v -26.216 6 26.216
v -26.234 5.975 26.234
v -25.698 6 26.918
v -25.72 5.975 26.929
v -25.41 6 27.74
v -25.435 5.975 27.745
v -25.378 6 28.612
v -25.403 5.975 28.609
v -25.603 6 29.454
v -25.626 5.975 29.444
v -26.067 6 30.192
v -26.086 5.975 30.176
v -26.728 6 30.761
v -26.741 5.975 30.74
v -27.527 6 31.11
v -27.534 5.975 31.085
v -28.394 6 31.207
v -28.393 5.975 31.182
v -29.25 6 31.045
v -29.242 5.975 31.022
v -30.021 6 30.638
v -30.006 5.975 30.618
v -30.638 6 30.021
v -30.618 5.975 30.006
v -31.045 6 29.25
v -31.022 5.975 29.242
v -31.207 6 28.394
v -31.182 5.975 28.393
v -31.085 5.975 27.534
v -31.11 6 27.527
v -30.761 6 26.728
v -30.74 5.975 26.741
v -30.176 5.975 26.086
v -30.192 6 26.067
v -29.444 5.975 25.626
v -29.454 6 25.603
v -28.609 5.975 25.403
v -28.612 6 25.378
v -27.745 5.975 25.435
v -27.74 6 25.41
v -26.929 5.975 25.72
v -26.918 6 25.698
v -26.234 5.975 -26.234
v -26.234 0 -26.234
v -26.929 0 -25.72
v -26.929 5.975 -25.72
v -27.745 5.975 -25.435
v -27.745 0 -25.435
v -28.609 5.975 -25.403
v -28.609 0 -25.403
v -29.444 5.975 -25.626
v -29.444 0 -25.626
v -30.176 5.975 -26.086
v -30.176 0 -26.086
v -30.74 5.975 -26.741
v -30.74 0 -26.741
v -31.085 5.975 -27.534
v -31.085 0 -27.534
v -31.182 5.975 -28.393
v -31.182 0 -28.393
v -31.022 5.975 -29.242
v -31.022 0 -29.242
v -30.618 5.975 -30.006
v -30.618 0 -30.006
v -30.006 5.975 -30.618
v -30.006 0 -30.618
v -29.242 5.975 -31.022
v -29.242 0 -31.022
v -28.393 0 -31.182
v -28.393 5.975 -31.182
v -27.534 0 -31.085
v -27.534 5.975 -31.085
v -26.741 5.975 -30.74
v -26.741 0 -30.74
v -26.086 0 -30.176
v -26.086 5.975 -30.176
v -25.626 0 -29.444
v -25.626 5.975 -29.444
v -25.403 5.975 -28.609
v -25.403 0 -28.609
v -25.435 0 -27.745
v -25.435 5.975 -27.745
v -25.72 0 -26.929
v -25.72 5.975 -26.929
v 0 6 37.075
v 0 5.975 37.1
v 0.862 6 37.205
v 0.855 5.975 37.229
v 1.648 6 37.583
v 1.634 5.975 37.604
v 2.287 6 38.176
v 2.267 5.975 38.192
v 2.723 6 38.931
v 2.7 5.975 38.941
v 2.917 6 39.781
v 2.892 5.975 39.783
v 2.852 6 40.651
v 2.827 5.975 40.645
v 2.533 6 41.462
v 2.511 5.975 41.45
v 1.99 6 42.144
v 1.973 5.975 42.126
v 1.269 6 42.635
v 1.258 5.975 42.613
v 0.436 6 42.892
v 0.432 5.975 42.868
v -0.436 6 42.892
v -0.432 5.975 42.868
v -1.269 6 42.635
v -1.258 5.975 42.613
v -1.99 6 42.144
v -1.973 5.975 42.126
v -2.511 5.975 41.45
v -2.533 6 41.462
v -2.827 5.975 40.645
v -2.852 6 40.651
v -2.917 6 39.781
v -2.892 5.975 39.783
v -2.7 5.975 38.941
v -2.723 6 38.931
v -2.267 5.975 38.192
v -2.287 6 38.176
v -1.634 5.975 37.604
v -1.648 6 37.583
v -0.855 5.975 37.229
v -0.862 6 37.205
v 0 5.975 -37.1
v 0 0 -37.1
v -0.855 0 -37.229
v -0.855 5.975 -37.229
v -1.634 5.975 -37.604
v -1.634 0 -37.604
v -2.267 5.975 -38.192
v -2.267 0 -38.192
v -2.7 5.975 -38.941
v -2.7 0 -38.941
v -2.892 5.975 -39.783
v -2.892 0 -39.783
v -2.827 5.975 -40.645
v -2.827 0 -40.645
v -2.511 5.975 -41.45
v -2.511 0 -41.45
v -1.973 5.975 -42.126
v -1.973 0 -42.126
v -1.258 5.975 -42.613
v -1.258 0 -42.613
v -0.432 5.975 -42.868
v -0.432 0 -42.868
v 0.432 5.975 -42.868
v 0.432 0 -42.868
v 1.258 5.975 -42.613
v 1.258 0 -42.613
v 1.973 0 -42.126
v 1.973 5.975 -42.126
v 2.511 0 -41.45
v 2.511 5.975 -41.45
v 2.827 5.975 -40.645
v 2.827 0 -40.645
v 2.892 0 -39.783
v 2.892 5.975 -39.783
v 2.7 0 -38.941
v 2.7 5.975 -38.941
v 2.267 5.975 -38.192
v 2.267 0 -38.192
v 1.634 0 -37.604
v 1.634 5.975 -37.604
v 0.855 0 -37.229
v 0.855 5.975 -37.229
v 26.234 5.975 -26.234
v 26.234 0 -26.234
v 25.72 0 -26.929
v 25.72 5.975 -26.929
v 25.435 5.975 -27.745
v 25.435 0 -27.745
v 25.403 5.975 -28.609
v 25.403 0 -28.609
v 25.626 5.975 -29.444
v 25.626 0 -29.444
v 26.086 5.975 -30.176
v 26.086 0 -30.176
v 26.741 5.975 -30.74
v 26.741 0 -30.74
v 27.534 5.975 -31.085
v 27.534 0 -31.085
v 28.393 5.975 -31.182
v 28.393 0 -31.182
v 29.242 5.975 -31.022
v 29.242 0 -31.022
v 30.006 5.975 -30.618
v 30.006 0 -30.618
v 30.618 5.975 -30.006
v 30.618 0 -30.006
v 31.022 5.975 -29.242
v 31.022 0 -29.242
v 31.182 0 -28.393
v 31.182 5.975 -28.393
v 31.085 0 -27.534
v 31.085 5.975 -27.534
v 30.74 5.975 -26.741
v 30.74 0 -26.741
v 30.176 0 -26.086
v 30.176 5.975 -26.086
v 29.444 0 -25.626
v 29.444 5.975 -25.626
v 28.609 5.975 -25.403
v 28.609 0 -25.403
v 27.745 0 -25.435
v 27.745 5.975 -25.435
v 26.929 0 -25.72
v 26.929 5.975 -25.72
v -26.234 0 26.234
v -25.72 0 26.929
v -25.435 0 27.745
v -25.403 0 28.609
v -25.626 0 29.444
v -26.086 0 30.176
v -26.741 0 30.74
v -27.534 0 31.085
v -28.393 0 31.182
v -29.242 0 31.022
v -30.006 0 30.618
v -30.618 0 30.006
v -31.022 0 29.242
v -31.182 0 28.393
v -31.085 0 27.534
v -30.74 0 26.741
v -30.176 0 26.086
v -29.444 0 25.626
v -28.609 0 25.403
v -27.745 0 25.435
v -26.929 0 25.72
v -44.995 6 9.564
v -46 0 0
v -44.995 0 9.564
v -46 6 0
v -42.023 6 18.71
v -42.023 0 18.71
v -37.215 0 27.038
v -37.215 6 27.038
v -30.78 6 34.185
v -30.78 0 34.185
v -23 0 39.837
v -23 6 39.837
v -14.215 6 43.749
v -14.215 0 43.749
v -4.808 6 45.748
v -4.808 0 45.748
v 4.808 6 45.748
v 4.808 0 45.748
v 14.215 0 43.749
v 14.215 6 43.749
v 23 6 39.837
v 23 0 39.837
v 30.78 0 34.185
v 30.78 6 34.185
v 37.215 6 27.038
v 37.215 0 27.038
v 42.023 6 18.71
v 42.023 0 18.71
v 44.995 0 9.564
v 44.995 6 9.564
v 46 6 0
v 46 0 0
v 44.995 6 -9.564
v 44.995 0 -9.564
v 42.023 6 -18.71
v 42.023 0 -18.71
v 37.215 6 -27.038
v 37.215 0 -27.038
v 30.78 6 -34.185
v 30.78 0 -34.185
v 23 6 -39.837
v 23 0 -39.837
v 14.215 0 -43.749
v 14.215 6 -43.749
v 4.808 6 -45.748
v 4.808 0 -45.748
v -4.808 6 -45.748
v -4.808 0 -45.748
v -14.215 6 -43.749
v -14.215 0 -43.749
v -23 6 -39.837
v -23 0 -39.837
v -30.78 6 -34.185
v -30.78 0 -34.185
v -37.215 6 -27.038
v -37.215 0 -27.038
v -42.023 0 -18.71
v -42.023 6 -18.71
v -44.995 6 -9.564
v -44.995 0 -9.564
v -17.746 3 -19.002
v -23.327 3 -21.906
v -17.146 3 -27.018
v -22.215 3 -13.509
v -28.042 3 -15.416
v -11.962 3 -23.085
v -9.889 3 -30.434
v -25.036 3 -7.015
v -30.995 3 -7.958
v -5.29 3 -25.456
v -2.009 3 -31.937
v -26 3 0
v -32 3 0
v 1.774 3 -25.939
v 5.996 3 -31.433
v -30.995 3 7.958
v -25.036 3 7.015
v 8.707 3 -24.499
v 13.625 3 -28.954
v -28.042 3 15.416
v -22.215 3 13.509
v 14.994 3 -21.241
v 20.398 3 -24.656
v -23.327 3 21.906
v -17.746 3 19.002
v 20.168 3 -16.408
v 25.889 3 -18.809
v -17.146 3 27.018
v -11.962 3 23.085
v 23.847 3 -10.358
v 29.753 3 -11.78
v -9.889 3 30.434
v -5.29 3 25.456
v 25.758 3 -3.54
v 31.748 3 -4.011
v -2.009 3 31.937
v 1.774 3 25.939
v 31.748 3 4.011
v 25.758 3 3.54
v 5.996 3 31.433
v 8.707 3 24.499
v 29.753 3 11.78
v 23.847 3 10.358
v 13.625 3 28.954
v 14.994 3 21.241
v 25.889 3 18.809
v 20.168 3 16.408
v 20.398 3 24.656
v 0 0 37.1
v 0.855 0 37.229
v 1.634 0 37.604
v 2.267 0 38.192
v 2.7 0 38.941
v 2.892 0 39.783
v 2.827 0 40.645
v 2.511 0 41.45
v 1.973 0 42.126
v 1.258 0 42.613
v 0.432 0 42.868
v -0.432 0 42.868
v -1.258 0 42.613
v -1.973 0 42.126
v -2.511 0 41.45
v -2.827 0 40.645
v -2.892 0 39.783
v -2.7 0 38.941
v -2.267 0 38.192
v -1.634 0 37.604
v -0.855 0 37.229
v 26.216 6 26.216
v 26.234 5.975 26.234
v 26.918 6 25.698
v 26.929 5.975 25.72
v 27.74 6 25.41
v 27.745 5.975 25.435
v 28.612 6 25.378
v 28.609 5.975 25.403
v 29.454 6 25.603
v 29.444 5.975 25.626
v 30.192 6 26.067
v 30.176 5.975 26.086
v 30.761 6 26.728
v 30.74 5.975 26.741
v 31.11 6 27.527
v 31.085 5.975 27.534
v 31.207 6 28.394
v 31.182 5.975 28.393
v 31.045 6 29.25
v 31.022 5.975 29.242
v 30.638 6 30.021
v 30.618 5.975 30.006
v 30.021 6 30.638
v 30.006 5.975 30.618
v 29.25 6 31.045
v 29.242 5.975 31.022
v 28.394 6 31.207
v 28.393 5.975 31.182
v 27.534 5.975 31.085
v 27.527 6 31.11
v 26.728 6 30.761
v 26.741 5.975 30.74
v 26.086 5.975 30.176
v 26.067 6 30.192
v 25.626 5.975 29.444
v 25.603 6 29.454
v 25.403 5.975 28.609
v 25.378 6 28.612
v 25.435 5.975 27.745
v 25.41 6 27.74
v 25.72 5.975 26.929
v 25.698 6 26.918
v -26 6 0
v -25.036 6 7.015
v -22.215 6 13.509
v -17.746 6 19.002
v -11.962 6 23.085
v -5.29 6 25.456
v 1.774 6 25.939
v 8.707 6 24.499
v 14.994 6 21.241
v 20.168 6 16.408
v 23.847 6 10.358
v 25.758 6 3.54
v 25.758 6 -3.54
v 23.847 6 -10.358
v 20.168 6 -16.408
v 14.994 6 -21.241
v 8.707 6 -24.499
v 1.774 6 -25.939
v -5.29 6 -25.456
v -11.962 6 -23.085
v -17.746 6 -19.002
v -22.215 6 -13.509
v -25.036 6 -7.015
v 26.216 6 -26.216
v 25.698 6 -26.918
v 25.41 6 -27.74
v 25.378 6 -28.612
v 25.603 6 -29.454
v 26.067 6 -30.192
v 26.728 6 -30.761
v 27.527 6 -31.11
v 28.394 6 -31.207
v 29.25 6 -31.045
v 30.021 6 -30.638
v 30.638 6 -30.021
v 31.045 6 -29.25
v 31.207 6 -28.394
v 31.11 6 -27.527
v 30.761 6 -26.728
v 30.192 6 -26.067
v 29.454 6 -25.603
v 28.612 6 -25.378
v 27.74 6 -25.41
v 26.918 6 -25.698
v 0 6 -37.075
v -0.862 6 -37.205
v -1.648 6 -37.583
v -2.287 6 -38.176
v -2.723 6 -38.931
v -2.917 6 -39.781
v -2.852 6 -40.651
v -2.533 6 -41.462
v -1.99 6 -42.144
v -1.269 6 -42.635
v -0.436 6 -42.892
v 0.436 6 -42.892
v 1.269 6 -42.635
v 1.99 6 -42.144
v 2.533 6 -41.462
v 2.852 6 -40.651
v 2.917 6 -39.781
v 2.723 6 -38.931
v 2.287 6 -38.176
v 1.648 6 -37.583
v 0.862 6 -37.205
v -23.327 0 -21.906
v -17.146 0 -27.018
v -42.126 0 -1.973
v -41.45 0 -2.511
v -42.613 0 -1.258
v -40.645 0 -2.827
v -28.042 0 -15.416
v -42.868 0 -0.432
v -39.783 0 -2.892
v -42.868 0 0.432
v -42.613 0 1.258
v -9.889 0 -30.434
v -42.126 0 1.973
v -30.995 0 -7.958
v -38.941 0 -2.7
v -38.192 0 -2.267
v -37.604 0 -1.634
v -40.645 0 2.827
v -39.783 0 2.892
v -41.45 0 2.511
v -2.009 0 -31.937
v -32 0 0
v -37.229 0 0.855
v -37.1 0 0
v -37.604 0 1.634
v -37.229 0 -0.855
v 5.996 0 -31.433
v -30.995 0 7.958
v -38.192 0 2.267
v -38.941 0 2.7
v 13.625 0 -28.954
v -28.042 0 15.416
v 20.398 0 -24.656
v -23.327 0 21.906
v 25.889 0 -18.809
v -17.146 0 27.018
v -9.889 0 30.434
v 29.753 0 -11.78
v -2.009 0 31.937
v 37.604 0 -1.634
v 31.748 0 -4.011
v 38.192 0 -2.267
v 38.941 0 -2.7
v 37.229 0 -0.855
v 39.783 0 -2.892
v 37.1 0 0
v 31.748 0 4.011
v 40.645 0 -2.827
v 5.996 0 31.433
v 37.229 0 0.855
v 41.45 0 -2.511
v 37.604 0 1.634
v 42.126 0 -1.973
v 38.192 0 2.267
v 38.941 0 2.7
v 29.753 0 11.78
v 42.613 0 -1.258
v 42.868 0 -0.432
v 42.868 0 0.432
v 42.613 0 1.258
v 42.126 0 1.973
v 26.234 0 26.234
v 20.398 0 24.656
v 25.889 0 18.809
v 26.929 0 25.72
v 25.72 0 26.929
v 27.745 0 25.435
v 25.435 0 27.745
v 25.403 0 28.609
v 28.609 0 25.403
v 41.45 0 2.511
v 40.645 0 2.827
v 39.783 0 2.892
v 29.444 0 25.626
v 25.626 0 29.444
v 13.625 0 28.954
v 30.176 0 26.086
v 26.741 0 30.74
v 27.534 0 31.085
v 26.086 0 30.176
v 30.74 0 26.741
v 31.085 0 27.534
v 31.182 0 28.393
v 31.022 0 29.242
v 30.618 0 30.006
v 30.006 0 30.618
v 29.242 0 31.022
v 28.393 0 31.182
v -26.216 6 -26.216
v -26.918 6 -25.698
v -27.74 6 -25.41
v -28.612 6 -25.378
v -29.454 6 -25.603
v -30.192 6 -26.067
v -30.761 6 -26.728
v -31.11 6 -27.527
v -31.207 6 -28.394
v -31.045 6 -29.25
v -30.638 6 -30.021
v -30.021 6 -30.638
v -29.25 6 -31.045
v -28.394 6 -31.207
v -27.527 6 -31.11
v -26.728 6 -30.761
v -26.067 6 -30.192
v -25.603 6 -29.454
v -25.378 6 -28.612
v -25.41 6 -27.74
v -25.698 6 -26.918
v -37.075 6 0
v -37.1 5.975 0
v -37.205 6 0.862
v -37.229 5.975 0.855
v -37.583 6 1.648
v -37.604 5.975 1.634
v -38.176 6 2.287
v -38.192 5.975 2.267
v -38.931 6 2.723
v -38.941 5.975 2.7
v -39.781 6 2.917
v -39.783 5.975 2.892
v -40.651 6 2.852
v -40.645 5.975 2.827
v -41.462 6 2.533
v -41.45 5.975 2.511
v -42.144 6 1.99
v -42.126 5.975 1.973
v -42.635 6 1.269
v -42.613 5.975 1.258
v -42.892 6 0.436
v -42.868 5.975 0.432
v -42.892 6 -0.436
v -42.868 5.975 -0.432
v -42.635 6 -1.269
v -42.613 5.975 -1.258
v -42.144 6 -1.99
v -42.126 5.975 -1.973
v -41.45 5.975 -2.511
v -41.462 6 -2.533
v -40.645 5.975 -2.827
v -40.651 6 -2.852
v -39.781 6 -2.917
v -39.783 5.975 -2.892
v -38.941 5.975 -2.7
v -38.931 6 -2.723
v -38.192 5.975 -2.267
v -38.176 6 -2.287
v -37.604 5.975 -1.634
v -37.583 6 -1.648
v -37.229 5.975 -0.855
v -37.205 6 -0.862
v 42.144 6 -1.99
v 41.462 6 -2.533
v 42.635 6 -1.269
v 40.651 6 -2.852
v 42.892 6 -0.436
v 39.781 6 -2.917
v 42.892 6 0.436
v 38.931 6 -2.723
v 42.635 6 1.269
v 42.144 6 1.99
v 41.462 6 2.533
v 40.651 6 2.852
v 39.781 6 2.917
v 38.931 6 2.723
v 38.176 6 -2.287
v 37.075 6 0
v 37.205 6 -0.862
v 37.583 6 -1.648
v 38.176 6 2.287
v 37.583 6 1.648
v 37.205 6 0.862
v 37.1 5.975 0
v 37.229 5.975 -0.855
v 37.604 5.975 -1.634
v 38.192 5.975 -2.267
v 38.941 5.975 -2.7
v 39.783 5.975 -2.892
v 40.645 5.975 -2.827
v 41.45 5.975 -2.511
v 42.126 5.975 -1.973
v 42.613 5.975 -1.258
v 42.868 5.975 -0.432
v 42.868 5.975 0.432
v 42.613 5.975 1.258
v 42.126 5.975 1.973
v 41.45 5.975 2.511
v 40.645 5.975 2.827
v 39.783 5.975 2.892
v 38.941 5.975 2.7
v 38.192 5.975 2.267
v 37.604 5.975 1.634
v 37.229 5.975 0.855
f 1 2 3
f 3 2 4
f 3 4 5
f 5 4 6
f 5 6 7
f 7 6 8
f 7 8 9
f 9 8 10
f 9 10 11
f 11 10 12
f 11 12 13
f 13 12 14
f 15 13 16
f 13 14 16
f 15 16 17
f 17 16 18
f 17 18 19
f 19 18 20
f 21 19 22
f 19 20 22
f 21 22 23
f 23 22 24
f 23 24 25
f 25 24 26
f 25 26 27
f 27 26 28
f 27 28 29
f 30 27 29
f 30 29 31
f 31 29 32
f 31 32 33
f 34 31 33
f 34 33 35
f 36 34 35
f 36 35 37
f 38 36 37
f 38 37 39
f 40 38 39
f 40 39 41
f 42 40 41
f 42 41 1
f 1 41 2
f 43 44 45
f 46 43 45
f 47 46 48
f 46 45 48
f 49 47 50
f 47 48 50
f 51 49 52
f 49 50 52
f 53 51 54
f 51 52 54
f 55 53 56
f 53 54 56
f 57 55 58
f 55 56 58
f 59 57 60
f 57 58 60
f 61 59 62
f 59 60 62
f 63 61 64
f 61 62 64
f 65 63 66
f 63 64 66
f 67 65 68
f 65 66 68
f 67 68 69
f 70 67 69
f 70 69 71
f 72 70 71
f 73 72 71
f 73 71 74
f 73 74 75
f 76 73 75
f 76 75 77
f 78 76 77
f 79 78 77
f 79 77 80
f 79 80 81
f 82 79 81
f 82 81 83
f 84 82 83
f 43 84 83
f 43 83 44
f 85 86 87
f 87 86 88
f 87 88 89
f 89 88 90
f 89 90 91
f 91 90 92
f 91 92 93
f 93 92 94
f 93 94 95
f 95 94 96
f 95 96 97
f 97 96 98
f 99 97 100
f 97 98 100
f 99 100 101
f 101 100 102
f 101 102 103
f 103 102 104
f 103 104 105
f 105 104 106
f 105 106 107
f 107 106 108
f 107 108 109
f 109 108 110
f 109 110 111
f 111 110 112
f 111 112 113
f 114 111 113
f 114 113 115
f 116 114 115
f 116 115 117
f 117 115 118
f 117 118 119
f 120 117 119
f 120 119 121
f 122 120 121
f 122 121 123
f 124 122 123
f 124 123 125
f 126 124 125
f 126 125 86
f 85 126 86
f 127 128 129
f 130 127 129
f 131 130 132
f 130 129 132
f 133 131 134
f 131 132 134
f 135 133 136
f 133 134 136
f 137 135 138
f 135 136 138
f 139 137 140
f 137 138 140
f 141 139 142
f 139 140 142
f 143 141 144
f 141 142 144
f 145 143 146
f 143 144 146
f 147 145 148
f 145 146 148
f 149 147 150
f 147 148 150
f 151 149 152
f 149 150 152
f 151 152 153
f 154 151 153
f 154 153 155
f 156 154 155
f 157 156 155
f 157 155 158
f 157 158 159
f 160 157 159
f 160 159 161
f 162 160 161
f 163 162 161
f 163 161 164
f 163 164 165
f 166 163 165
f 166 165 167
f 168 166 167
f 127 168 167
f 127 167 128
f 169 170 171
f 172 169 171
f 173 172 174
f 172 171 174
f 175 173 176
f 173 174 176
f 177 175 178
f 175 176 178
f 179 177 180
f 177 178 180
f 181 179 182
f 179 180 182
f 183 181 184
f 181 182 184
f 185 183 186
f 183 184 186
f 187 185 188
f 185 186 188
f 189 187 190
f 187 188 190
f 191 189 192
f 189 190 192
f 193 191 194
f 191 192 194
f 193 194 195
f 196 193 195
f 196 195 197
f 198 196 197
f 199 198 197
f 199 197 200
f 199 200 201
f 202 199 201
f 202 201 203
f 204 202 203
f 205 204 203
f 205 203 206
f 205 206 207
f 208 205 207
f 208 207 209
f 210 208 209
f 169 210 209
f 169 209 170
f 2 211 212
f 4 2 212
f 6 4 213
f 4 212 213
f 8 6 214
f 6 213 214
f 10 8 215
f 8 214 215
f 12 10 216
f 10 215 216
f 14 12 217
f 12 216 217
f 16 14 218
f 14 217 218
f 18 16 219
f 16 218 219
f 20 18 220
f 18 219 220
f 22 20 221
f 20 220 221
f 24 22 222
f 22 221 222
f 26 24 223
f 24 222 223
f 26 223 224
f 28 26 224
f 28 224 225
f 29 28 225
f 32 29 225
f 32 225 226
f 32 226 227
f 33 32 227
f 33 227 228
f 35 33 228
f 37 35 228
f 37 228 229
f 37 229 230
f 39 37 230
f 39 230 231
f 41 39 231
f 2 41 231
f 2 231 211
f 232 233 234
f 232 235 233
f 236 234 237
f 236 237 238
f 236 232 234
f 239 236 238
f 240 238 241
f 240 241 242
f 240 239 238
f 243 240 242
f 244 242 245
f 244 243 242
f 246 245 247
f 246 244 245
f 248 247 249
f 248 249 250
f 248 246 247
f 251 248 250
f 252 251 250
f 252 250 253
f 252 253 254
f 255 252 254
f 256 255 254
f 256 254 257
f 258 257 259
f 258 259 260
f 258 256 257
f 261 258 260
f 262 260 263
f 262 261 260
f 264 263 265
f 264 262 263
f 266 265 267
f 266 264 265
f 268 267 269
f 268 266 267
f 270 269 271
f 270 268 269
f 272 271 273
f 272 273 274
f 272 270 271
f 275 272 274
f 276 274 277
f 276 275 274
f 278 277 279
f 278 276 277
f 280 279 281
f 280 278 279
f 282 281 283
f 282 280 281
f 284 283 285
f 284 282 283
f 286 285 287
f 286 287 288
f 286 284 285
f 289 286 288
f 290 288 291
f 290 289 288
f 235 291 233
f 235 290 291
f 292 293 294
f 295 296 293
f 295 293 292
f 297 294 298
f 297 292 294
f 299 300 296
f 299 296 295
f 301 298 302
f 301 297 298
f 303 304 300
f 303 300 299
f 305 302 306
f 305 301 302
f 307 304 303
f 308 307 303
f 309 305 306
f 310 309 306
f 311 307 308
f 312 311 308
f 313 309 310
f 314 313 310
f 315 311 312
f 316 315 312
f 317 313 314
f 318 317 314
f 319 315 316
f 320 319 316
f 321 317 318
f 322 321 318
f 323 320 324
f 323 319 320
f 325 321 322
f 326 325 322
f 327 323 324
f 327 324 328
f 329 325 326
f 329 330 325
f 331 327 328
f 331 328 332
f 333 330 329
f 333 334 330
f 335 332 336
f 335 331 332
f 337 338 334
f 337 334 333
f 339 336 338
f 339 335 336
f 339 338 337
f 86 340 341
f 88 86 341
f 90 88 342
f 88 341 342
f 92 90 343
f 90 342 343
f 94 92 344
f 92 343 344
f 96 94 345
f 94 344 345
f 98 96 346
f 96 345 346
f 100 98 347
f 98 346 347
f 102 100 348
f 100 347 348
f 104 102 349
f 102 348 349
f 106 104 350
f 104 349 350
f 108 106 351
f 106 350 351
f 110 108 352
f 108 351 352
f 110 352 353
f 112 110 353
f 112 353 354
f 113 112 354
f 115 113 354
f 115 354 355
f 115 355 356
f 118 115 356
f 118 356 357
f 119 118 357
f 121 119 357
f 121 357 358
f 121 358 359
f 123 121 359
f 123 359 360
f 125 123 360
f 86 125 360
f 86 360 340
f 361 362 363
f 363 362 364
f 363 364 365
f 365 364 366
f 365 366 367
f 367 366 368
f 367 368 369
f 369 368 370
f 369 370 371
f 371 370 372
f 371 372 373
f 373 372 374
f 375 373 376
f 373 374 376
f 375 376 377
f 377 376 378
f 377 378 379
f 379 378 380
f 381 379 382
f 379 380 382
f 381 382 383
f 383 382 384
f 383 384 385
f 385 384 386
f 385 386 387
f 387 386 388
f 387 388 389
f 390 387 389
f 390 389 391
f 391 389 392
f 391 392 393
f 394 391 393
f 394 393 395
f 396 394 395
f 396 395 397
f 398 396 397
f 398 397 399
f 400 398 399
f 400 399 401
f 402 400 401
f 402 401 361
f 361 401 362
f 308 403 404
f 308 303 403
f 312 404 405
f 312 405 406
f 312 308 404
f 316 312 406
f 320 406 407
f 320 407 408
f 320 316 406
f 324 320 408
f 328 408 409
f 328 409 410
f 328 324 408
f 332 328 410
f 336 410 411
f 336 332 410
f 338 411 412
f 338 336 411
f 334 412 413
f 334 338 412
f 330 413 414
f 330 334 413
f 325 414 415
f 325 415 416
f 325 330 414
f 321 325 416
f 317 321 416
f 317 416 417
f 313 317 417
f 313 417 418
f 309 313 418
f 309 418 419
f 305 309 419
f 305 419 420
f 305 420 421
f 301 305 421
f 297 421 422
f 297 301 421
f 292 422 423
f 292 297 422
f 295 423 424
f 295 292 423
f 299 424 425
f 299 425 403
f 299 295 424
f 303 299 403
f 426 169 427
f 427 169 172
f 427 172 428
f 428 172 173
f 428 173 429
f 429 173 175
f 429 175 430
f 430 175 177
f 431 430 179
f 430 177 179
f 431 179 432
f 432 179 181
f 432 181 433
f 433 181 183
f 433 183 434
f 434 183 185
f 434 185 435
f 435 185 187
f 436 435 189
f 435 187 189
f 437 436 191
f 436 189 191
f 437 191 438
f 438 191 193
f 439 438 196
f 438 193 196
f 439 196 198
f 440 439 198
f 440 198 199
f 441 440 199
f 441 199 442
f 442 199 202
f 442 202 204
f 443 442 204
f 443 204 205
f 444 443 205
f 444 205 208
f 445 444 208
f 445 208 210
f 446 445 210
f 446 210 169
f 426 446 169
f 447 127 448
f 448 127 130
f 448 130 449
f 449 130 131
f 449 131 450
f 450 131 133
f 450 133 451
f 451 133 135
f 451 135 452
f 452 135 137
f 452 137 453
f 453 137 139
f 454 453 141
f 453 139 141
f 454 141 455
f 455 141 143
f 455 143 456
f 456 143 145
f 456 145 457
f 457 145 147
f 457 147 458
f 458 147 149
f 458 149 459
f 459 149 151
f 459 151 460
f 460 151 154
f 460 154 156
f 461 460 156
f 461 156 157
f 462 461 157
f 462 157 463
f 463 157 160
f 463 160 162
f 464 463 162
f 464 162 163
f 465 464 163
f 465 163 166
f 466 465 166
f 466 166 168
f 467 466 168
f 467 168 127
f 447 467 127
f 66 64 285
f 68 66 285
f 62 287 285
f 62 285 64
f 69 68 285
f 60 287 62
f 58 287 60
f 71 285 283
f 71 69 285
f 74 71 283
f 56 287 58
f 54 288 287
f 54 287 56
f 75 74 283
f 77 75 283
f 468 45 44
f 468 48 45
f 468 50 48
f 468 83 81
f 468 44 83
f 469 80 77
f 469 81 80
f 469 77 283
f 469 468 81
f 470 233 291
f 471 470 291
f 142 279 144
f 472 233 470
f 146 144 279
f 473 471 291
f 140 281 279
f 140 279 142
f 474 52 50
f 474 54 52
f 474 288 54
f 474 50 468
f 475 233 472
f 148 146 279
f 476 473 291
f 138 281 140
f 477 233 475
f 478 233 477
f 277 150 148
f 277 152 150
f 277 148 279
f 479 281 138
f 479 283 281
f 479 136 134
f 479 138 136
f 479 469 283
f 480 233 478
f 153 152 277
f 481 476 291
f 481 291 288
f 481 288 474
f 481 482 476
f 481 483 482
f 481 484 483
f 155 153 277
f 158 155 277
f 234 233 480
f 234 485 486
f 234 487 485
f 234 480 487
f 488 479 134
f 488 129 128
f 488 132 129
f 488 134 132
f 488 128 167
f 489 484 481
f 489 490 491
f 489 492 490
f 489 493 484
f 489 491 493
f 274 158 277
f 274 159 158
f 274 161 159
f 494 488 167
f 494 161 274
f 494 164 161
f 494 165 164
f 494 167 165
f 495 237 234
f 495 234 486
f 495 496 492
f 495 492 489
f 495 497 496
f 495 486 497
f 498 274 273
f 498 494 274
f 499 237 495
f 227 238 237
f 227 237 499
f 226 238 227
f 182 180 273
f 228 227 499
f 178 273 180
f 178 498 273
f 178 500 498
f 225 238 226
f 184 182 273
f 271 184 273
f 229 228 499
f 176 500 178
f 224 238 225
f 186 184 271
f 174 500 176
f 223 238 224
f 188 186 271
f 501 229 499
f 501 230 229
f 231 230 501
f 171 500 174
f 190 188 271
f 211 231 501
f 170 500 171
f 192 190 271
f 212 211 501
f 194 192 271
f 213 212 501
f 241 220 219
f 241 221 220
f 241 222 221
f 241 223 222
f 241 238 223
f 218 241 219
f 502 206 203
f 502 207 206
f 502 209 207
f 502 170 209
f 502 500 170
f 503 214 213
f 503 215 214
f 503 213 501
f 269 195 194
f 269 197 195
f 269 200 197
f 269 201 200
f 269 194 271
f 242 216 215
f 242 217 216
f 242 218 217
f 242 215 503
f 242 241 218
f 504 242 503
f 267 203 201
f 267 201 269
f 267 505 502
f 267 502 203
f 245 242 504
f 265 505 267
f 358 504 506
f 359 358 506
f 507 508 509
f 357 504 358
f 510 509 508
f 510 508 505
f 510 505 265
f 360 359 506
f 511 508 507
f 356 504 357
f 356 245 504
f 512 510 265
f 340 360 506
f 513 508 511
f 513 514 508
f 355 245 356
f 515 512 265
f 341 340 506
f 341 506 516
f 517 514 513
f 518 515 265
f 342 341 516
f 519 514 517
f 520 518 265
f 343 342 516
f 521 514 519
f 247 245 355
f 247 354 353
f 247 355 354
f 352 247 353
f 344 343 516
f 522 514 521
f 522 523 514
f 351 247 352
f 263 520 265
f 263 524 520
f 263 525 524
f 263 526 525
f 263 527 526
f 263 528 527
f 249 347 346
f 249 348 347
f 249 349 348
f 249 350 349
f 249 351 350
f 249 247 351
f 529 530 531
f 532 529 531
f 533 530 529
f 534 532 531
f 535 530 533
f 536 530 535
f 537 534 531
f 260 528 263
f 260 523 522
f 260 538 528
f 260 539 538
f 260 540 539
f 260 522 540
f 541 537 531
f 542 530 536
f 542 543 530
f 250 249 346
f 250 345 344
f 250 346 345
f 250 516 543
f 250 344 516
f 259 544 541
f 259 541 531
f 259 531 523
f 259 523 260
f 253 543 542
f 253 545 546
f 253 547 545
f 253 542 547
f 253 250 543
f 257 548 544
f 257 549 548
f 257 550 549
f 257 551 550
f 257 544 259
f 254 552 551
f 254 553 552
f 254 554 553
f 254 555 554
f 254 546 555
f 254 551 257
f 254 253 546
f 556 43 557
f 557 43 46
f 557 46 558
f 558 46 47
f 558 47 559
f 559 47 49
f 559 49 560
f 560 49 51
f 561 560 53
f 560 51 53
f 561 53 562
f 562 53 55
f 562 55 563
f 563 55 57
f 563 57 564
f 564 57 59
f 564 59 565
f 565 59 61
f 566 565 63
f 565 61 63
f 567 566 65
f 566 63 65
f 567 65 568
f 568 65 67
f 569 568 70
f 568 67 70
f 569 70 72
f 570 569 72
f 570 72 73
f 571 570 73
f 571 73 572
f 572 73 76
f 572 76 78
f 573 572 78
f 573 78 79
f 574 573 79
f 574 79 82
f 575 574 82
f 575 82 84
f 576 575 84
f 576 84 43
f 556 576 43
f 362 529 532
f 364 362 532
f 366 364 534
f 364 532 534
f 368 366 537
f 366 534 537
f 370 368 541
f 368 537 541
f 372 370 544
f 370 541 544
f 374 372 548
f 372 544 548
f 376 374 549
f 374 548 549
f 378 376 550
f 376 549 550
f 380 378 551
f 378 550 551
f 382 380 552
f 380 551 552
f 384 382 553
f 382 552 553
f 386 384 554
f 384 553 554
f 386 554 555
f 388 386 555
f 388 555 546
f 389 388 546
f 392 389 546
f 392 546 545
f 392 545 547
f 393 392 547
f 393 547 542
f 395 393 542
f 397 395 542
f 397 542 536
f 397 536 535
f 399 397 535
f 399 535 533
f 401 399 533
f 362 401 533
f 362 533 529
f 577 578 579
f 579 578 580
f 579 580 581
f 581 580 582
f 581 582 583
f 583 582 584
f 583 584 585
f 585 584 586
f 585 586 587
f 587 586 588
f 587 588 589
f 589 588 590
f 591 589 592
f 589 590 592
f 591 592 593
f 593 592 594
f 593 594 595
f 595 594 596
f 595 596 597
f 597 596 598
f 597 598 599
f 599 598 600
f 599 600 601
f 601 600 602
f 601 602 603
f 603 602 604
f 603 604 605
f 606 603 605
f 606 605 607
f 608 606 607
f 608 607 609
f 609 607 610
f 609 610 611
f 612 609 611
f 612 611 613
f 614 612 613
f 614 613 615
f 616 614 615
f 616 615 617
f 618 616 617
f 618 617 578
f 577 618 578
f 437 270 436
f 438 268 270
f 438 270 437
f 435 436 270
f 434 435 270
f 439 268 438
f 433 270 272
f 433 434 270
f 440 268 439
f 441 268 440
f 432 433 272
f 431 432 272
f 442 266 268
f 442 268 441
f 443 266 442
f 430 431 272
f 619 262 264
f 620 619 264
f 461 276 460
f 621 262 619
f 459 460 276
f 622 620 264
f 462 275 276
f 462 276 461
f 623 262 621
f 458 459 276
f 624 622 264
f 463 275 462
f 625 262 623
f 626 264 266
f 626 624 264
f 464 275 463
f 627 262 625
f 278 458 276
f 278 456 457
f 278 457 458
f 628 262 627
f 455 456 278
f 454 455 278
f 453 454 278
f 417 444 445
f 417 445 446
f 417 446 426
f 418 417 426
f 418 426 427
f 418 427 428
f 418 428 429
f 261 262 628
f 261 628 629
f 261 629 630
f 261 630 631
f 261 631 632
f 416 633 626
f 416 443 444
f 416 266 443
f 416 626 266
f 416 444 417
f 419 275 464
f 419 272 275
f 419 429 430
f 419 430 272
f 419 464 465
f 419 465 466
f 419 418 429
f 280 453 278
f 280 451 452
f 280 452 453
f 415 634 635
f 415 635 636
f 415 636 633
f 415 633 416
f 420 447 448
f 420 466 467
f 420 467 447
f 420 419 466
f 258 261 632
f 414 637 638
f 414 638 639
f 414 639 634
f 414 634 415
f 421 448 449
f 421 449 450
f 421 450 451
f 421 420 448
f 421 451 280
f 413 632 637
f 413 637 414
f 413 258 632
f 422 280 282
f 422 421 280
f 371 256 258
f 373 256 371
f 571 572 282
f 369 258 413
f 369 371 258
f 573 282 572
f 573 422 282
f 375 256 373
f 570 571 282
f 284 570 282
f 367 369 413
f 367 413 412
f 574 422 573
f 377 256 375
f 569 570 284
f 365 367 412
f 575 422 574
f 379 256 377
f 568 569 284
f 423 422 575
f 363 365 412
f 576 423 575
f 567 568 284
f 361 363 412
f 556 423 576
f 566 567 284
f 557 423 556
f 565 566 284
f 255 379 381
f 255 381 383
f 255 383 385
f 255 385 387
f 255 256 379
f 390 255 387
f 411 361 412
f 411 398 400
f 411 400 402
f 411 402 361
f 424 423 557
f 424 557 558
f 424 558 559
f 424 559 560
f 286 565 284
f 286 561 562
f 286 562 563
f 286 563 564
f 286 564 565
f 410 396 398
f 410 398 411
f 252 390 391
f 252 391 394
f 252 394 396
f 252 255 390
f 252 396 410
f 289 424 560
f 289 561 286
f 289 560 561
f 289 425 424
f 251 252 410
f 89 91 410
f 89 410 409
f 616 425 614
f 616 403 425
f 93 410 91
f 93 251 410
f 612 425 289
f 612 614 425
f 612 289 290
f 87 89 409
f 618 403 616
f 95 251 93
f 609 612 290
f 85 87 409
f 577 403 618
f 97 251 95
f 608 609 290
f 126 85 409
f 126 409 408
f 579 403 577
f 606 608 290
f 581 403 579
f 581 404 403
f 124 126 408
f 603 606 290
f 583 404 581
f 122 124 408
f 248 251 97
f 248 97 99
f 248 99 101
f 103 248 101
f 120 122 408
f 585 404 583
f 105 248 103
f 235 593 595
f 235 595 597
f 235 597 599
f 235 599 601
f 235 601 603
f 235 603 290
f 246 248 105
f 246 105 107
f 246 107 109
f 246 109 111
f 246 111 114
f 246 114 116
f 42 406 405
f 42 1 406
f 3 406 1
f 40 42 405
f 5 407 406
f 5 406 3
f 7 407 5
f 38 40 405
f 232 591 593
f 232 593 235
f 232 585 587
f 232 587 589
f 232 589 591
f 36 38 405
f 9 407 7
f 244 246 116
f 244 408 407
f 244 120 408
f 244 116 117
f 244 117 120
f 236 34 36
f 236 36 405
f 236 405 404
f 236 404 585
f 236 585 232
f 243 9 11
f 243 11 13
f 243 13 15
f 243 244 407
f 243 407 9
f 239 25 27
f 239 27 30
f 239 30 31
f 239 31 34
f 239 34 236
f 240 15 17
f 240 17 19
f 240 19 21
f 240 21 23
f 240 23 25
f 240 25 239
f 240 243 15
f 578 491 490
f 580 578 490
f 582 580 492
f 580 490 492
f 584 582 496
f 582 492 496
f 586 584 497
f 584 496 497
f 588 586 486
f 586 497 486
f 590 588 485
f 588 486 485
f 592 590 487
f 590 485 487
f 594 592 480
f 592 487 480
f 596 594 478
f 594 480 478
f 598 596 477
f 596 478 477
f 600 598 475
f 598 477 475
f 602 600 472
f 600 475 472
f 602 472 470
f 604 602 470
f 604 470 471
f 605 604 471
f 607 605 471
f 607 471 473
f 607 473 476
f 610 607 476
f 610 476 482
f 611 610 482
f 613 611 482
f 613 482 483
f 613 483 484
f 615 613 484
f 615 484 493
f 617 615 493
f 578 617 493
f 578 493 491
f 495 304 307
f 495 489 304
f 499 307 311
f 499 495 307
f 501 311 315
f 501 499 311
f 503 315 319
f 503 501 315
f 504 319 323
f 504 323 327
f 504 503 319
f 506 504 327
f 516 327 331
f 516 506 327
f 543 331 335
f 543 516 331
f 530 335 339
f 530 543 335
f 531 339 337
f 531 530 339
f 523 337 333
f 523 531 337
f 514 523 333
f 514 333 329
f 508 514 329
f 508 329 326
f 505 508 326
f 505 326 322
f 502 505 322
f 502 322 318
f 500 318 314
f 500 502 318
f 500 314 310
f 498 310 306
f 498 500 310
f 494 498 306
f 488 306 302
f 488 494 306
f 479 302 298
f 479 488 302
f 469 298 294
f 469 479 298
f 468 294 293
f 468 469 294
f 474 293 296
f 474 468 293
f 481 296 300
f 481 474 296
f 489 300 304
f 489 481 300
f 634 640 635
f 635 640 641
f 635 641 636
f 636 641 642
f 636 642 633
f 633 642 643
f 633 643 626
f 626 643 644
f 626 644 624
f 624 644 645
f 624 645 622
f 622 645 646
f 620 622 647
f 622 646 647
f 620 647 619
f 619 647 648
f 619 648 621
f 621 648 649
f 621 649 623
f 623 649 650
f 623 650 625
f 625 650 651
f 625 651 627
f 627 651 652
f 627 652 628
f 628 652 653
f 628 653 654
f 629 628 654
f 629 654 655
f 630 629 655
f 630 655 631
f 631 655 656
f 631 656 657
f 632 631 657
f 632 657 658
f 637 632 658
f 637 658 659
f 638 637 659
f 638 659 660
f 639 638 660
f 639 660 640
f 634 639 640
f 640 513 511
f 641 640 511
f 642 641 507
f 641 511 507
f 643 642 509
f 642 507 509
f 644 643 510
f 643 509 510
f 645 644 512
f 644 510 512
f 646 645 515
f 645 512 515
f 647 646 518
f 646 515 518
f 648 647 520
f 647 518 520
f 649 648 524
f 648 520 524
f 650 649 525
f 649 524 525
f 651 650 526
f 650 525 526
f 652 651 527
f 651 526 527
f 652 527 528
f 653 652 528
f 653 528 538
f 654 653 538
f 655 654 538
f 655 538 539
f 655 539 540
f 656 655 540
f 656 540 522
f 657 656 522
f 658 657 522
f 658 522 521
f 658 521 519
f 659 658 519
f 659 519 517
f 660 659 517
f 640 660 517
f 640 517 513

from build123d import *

# Parameters (mm, degrees)
M5_CLEARANCE_HOLE1_D           = 5.8
M5_CLEARANCE_HOLE1_DEPTH       = 6
M5_CLEARANCE_HOLE1_CSINK_D     = 5.85
M5_CLEARANCE_HOLE1_CSINK_ANGLE = 90
CIRPATTERN1_COUNT              = 8


with BuildPart() as part:
    # Sketch1 → Revolve1 (revolve)
    with BuildSketch(Plane.XY):
        Polygon((-32, 0), (-46, 0), (-46, 6), (-26, 6), (-26, 3), (-32, 3), align=None)
    revolve(axis=Axis((0, 0, 0), (0, 1, 0)))

    # M5 Clearance Hole1
    with Locations(Plane(origin=(0, 6, 0), x_dir=(1, 0, 0), z_dir=(0, 1, 0))):
        with Locations((40, 0)):
            m5_clearance_hole1 = CounterSinkHole(M5_CLEARANCE_HOLE1_D / 2, M5_CLEARANCE_HOLE1_CSINK_D / 2, depth=M5_CLEARANCE_HOLE1_DEPTH, counter_sink_angle=M5_CLEARANCE_HOLE1_CSINK_ANGLE)

    # CirPattern1: M5 Clearance Hole1 ×8 about axis
    cirpattern1_axis = Axis((0, 0, 0), (0, 1, 0))
    for i in range(1, CIRPATTERN1_COUNT):
        add(m5_clearance_hole1.rotate(cirpattern1_axis, i * 360 / CIRPATTERN1_COUNT), mode=Mode.SUBTRACT)


solid = part.part
